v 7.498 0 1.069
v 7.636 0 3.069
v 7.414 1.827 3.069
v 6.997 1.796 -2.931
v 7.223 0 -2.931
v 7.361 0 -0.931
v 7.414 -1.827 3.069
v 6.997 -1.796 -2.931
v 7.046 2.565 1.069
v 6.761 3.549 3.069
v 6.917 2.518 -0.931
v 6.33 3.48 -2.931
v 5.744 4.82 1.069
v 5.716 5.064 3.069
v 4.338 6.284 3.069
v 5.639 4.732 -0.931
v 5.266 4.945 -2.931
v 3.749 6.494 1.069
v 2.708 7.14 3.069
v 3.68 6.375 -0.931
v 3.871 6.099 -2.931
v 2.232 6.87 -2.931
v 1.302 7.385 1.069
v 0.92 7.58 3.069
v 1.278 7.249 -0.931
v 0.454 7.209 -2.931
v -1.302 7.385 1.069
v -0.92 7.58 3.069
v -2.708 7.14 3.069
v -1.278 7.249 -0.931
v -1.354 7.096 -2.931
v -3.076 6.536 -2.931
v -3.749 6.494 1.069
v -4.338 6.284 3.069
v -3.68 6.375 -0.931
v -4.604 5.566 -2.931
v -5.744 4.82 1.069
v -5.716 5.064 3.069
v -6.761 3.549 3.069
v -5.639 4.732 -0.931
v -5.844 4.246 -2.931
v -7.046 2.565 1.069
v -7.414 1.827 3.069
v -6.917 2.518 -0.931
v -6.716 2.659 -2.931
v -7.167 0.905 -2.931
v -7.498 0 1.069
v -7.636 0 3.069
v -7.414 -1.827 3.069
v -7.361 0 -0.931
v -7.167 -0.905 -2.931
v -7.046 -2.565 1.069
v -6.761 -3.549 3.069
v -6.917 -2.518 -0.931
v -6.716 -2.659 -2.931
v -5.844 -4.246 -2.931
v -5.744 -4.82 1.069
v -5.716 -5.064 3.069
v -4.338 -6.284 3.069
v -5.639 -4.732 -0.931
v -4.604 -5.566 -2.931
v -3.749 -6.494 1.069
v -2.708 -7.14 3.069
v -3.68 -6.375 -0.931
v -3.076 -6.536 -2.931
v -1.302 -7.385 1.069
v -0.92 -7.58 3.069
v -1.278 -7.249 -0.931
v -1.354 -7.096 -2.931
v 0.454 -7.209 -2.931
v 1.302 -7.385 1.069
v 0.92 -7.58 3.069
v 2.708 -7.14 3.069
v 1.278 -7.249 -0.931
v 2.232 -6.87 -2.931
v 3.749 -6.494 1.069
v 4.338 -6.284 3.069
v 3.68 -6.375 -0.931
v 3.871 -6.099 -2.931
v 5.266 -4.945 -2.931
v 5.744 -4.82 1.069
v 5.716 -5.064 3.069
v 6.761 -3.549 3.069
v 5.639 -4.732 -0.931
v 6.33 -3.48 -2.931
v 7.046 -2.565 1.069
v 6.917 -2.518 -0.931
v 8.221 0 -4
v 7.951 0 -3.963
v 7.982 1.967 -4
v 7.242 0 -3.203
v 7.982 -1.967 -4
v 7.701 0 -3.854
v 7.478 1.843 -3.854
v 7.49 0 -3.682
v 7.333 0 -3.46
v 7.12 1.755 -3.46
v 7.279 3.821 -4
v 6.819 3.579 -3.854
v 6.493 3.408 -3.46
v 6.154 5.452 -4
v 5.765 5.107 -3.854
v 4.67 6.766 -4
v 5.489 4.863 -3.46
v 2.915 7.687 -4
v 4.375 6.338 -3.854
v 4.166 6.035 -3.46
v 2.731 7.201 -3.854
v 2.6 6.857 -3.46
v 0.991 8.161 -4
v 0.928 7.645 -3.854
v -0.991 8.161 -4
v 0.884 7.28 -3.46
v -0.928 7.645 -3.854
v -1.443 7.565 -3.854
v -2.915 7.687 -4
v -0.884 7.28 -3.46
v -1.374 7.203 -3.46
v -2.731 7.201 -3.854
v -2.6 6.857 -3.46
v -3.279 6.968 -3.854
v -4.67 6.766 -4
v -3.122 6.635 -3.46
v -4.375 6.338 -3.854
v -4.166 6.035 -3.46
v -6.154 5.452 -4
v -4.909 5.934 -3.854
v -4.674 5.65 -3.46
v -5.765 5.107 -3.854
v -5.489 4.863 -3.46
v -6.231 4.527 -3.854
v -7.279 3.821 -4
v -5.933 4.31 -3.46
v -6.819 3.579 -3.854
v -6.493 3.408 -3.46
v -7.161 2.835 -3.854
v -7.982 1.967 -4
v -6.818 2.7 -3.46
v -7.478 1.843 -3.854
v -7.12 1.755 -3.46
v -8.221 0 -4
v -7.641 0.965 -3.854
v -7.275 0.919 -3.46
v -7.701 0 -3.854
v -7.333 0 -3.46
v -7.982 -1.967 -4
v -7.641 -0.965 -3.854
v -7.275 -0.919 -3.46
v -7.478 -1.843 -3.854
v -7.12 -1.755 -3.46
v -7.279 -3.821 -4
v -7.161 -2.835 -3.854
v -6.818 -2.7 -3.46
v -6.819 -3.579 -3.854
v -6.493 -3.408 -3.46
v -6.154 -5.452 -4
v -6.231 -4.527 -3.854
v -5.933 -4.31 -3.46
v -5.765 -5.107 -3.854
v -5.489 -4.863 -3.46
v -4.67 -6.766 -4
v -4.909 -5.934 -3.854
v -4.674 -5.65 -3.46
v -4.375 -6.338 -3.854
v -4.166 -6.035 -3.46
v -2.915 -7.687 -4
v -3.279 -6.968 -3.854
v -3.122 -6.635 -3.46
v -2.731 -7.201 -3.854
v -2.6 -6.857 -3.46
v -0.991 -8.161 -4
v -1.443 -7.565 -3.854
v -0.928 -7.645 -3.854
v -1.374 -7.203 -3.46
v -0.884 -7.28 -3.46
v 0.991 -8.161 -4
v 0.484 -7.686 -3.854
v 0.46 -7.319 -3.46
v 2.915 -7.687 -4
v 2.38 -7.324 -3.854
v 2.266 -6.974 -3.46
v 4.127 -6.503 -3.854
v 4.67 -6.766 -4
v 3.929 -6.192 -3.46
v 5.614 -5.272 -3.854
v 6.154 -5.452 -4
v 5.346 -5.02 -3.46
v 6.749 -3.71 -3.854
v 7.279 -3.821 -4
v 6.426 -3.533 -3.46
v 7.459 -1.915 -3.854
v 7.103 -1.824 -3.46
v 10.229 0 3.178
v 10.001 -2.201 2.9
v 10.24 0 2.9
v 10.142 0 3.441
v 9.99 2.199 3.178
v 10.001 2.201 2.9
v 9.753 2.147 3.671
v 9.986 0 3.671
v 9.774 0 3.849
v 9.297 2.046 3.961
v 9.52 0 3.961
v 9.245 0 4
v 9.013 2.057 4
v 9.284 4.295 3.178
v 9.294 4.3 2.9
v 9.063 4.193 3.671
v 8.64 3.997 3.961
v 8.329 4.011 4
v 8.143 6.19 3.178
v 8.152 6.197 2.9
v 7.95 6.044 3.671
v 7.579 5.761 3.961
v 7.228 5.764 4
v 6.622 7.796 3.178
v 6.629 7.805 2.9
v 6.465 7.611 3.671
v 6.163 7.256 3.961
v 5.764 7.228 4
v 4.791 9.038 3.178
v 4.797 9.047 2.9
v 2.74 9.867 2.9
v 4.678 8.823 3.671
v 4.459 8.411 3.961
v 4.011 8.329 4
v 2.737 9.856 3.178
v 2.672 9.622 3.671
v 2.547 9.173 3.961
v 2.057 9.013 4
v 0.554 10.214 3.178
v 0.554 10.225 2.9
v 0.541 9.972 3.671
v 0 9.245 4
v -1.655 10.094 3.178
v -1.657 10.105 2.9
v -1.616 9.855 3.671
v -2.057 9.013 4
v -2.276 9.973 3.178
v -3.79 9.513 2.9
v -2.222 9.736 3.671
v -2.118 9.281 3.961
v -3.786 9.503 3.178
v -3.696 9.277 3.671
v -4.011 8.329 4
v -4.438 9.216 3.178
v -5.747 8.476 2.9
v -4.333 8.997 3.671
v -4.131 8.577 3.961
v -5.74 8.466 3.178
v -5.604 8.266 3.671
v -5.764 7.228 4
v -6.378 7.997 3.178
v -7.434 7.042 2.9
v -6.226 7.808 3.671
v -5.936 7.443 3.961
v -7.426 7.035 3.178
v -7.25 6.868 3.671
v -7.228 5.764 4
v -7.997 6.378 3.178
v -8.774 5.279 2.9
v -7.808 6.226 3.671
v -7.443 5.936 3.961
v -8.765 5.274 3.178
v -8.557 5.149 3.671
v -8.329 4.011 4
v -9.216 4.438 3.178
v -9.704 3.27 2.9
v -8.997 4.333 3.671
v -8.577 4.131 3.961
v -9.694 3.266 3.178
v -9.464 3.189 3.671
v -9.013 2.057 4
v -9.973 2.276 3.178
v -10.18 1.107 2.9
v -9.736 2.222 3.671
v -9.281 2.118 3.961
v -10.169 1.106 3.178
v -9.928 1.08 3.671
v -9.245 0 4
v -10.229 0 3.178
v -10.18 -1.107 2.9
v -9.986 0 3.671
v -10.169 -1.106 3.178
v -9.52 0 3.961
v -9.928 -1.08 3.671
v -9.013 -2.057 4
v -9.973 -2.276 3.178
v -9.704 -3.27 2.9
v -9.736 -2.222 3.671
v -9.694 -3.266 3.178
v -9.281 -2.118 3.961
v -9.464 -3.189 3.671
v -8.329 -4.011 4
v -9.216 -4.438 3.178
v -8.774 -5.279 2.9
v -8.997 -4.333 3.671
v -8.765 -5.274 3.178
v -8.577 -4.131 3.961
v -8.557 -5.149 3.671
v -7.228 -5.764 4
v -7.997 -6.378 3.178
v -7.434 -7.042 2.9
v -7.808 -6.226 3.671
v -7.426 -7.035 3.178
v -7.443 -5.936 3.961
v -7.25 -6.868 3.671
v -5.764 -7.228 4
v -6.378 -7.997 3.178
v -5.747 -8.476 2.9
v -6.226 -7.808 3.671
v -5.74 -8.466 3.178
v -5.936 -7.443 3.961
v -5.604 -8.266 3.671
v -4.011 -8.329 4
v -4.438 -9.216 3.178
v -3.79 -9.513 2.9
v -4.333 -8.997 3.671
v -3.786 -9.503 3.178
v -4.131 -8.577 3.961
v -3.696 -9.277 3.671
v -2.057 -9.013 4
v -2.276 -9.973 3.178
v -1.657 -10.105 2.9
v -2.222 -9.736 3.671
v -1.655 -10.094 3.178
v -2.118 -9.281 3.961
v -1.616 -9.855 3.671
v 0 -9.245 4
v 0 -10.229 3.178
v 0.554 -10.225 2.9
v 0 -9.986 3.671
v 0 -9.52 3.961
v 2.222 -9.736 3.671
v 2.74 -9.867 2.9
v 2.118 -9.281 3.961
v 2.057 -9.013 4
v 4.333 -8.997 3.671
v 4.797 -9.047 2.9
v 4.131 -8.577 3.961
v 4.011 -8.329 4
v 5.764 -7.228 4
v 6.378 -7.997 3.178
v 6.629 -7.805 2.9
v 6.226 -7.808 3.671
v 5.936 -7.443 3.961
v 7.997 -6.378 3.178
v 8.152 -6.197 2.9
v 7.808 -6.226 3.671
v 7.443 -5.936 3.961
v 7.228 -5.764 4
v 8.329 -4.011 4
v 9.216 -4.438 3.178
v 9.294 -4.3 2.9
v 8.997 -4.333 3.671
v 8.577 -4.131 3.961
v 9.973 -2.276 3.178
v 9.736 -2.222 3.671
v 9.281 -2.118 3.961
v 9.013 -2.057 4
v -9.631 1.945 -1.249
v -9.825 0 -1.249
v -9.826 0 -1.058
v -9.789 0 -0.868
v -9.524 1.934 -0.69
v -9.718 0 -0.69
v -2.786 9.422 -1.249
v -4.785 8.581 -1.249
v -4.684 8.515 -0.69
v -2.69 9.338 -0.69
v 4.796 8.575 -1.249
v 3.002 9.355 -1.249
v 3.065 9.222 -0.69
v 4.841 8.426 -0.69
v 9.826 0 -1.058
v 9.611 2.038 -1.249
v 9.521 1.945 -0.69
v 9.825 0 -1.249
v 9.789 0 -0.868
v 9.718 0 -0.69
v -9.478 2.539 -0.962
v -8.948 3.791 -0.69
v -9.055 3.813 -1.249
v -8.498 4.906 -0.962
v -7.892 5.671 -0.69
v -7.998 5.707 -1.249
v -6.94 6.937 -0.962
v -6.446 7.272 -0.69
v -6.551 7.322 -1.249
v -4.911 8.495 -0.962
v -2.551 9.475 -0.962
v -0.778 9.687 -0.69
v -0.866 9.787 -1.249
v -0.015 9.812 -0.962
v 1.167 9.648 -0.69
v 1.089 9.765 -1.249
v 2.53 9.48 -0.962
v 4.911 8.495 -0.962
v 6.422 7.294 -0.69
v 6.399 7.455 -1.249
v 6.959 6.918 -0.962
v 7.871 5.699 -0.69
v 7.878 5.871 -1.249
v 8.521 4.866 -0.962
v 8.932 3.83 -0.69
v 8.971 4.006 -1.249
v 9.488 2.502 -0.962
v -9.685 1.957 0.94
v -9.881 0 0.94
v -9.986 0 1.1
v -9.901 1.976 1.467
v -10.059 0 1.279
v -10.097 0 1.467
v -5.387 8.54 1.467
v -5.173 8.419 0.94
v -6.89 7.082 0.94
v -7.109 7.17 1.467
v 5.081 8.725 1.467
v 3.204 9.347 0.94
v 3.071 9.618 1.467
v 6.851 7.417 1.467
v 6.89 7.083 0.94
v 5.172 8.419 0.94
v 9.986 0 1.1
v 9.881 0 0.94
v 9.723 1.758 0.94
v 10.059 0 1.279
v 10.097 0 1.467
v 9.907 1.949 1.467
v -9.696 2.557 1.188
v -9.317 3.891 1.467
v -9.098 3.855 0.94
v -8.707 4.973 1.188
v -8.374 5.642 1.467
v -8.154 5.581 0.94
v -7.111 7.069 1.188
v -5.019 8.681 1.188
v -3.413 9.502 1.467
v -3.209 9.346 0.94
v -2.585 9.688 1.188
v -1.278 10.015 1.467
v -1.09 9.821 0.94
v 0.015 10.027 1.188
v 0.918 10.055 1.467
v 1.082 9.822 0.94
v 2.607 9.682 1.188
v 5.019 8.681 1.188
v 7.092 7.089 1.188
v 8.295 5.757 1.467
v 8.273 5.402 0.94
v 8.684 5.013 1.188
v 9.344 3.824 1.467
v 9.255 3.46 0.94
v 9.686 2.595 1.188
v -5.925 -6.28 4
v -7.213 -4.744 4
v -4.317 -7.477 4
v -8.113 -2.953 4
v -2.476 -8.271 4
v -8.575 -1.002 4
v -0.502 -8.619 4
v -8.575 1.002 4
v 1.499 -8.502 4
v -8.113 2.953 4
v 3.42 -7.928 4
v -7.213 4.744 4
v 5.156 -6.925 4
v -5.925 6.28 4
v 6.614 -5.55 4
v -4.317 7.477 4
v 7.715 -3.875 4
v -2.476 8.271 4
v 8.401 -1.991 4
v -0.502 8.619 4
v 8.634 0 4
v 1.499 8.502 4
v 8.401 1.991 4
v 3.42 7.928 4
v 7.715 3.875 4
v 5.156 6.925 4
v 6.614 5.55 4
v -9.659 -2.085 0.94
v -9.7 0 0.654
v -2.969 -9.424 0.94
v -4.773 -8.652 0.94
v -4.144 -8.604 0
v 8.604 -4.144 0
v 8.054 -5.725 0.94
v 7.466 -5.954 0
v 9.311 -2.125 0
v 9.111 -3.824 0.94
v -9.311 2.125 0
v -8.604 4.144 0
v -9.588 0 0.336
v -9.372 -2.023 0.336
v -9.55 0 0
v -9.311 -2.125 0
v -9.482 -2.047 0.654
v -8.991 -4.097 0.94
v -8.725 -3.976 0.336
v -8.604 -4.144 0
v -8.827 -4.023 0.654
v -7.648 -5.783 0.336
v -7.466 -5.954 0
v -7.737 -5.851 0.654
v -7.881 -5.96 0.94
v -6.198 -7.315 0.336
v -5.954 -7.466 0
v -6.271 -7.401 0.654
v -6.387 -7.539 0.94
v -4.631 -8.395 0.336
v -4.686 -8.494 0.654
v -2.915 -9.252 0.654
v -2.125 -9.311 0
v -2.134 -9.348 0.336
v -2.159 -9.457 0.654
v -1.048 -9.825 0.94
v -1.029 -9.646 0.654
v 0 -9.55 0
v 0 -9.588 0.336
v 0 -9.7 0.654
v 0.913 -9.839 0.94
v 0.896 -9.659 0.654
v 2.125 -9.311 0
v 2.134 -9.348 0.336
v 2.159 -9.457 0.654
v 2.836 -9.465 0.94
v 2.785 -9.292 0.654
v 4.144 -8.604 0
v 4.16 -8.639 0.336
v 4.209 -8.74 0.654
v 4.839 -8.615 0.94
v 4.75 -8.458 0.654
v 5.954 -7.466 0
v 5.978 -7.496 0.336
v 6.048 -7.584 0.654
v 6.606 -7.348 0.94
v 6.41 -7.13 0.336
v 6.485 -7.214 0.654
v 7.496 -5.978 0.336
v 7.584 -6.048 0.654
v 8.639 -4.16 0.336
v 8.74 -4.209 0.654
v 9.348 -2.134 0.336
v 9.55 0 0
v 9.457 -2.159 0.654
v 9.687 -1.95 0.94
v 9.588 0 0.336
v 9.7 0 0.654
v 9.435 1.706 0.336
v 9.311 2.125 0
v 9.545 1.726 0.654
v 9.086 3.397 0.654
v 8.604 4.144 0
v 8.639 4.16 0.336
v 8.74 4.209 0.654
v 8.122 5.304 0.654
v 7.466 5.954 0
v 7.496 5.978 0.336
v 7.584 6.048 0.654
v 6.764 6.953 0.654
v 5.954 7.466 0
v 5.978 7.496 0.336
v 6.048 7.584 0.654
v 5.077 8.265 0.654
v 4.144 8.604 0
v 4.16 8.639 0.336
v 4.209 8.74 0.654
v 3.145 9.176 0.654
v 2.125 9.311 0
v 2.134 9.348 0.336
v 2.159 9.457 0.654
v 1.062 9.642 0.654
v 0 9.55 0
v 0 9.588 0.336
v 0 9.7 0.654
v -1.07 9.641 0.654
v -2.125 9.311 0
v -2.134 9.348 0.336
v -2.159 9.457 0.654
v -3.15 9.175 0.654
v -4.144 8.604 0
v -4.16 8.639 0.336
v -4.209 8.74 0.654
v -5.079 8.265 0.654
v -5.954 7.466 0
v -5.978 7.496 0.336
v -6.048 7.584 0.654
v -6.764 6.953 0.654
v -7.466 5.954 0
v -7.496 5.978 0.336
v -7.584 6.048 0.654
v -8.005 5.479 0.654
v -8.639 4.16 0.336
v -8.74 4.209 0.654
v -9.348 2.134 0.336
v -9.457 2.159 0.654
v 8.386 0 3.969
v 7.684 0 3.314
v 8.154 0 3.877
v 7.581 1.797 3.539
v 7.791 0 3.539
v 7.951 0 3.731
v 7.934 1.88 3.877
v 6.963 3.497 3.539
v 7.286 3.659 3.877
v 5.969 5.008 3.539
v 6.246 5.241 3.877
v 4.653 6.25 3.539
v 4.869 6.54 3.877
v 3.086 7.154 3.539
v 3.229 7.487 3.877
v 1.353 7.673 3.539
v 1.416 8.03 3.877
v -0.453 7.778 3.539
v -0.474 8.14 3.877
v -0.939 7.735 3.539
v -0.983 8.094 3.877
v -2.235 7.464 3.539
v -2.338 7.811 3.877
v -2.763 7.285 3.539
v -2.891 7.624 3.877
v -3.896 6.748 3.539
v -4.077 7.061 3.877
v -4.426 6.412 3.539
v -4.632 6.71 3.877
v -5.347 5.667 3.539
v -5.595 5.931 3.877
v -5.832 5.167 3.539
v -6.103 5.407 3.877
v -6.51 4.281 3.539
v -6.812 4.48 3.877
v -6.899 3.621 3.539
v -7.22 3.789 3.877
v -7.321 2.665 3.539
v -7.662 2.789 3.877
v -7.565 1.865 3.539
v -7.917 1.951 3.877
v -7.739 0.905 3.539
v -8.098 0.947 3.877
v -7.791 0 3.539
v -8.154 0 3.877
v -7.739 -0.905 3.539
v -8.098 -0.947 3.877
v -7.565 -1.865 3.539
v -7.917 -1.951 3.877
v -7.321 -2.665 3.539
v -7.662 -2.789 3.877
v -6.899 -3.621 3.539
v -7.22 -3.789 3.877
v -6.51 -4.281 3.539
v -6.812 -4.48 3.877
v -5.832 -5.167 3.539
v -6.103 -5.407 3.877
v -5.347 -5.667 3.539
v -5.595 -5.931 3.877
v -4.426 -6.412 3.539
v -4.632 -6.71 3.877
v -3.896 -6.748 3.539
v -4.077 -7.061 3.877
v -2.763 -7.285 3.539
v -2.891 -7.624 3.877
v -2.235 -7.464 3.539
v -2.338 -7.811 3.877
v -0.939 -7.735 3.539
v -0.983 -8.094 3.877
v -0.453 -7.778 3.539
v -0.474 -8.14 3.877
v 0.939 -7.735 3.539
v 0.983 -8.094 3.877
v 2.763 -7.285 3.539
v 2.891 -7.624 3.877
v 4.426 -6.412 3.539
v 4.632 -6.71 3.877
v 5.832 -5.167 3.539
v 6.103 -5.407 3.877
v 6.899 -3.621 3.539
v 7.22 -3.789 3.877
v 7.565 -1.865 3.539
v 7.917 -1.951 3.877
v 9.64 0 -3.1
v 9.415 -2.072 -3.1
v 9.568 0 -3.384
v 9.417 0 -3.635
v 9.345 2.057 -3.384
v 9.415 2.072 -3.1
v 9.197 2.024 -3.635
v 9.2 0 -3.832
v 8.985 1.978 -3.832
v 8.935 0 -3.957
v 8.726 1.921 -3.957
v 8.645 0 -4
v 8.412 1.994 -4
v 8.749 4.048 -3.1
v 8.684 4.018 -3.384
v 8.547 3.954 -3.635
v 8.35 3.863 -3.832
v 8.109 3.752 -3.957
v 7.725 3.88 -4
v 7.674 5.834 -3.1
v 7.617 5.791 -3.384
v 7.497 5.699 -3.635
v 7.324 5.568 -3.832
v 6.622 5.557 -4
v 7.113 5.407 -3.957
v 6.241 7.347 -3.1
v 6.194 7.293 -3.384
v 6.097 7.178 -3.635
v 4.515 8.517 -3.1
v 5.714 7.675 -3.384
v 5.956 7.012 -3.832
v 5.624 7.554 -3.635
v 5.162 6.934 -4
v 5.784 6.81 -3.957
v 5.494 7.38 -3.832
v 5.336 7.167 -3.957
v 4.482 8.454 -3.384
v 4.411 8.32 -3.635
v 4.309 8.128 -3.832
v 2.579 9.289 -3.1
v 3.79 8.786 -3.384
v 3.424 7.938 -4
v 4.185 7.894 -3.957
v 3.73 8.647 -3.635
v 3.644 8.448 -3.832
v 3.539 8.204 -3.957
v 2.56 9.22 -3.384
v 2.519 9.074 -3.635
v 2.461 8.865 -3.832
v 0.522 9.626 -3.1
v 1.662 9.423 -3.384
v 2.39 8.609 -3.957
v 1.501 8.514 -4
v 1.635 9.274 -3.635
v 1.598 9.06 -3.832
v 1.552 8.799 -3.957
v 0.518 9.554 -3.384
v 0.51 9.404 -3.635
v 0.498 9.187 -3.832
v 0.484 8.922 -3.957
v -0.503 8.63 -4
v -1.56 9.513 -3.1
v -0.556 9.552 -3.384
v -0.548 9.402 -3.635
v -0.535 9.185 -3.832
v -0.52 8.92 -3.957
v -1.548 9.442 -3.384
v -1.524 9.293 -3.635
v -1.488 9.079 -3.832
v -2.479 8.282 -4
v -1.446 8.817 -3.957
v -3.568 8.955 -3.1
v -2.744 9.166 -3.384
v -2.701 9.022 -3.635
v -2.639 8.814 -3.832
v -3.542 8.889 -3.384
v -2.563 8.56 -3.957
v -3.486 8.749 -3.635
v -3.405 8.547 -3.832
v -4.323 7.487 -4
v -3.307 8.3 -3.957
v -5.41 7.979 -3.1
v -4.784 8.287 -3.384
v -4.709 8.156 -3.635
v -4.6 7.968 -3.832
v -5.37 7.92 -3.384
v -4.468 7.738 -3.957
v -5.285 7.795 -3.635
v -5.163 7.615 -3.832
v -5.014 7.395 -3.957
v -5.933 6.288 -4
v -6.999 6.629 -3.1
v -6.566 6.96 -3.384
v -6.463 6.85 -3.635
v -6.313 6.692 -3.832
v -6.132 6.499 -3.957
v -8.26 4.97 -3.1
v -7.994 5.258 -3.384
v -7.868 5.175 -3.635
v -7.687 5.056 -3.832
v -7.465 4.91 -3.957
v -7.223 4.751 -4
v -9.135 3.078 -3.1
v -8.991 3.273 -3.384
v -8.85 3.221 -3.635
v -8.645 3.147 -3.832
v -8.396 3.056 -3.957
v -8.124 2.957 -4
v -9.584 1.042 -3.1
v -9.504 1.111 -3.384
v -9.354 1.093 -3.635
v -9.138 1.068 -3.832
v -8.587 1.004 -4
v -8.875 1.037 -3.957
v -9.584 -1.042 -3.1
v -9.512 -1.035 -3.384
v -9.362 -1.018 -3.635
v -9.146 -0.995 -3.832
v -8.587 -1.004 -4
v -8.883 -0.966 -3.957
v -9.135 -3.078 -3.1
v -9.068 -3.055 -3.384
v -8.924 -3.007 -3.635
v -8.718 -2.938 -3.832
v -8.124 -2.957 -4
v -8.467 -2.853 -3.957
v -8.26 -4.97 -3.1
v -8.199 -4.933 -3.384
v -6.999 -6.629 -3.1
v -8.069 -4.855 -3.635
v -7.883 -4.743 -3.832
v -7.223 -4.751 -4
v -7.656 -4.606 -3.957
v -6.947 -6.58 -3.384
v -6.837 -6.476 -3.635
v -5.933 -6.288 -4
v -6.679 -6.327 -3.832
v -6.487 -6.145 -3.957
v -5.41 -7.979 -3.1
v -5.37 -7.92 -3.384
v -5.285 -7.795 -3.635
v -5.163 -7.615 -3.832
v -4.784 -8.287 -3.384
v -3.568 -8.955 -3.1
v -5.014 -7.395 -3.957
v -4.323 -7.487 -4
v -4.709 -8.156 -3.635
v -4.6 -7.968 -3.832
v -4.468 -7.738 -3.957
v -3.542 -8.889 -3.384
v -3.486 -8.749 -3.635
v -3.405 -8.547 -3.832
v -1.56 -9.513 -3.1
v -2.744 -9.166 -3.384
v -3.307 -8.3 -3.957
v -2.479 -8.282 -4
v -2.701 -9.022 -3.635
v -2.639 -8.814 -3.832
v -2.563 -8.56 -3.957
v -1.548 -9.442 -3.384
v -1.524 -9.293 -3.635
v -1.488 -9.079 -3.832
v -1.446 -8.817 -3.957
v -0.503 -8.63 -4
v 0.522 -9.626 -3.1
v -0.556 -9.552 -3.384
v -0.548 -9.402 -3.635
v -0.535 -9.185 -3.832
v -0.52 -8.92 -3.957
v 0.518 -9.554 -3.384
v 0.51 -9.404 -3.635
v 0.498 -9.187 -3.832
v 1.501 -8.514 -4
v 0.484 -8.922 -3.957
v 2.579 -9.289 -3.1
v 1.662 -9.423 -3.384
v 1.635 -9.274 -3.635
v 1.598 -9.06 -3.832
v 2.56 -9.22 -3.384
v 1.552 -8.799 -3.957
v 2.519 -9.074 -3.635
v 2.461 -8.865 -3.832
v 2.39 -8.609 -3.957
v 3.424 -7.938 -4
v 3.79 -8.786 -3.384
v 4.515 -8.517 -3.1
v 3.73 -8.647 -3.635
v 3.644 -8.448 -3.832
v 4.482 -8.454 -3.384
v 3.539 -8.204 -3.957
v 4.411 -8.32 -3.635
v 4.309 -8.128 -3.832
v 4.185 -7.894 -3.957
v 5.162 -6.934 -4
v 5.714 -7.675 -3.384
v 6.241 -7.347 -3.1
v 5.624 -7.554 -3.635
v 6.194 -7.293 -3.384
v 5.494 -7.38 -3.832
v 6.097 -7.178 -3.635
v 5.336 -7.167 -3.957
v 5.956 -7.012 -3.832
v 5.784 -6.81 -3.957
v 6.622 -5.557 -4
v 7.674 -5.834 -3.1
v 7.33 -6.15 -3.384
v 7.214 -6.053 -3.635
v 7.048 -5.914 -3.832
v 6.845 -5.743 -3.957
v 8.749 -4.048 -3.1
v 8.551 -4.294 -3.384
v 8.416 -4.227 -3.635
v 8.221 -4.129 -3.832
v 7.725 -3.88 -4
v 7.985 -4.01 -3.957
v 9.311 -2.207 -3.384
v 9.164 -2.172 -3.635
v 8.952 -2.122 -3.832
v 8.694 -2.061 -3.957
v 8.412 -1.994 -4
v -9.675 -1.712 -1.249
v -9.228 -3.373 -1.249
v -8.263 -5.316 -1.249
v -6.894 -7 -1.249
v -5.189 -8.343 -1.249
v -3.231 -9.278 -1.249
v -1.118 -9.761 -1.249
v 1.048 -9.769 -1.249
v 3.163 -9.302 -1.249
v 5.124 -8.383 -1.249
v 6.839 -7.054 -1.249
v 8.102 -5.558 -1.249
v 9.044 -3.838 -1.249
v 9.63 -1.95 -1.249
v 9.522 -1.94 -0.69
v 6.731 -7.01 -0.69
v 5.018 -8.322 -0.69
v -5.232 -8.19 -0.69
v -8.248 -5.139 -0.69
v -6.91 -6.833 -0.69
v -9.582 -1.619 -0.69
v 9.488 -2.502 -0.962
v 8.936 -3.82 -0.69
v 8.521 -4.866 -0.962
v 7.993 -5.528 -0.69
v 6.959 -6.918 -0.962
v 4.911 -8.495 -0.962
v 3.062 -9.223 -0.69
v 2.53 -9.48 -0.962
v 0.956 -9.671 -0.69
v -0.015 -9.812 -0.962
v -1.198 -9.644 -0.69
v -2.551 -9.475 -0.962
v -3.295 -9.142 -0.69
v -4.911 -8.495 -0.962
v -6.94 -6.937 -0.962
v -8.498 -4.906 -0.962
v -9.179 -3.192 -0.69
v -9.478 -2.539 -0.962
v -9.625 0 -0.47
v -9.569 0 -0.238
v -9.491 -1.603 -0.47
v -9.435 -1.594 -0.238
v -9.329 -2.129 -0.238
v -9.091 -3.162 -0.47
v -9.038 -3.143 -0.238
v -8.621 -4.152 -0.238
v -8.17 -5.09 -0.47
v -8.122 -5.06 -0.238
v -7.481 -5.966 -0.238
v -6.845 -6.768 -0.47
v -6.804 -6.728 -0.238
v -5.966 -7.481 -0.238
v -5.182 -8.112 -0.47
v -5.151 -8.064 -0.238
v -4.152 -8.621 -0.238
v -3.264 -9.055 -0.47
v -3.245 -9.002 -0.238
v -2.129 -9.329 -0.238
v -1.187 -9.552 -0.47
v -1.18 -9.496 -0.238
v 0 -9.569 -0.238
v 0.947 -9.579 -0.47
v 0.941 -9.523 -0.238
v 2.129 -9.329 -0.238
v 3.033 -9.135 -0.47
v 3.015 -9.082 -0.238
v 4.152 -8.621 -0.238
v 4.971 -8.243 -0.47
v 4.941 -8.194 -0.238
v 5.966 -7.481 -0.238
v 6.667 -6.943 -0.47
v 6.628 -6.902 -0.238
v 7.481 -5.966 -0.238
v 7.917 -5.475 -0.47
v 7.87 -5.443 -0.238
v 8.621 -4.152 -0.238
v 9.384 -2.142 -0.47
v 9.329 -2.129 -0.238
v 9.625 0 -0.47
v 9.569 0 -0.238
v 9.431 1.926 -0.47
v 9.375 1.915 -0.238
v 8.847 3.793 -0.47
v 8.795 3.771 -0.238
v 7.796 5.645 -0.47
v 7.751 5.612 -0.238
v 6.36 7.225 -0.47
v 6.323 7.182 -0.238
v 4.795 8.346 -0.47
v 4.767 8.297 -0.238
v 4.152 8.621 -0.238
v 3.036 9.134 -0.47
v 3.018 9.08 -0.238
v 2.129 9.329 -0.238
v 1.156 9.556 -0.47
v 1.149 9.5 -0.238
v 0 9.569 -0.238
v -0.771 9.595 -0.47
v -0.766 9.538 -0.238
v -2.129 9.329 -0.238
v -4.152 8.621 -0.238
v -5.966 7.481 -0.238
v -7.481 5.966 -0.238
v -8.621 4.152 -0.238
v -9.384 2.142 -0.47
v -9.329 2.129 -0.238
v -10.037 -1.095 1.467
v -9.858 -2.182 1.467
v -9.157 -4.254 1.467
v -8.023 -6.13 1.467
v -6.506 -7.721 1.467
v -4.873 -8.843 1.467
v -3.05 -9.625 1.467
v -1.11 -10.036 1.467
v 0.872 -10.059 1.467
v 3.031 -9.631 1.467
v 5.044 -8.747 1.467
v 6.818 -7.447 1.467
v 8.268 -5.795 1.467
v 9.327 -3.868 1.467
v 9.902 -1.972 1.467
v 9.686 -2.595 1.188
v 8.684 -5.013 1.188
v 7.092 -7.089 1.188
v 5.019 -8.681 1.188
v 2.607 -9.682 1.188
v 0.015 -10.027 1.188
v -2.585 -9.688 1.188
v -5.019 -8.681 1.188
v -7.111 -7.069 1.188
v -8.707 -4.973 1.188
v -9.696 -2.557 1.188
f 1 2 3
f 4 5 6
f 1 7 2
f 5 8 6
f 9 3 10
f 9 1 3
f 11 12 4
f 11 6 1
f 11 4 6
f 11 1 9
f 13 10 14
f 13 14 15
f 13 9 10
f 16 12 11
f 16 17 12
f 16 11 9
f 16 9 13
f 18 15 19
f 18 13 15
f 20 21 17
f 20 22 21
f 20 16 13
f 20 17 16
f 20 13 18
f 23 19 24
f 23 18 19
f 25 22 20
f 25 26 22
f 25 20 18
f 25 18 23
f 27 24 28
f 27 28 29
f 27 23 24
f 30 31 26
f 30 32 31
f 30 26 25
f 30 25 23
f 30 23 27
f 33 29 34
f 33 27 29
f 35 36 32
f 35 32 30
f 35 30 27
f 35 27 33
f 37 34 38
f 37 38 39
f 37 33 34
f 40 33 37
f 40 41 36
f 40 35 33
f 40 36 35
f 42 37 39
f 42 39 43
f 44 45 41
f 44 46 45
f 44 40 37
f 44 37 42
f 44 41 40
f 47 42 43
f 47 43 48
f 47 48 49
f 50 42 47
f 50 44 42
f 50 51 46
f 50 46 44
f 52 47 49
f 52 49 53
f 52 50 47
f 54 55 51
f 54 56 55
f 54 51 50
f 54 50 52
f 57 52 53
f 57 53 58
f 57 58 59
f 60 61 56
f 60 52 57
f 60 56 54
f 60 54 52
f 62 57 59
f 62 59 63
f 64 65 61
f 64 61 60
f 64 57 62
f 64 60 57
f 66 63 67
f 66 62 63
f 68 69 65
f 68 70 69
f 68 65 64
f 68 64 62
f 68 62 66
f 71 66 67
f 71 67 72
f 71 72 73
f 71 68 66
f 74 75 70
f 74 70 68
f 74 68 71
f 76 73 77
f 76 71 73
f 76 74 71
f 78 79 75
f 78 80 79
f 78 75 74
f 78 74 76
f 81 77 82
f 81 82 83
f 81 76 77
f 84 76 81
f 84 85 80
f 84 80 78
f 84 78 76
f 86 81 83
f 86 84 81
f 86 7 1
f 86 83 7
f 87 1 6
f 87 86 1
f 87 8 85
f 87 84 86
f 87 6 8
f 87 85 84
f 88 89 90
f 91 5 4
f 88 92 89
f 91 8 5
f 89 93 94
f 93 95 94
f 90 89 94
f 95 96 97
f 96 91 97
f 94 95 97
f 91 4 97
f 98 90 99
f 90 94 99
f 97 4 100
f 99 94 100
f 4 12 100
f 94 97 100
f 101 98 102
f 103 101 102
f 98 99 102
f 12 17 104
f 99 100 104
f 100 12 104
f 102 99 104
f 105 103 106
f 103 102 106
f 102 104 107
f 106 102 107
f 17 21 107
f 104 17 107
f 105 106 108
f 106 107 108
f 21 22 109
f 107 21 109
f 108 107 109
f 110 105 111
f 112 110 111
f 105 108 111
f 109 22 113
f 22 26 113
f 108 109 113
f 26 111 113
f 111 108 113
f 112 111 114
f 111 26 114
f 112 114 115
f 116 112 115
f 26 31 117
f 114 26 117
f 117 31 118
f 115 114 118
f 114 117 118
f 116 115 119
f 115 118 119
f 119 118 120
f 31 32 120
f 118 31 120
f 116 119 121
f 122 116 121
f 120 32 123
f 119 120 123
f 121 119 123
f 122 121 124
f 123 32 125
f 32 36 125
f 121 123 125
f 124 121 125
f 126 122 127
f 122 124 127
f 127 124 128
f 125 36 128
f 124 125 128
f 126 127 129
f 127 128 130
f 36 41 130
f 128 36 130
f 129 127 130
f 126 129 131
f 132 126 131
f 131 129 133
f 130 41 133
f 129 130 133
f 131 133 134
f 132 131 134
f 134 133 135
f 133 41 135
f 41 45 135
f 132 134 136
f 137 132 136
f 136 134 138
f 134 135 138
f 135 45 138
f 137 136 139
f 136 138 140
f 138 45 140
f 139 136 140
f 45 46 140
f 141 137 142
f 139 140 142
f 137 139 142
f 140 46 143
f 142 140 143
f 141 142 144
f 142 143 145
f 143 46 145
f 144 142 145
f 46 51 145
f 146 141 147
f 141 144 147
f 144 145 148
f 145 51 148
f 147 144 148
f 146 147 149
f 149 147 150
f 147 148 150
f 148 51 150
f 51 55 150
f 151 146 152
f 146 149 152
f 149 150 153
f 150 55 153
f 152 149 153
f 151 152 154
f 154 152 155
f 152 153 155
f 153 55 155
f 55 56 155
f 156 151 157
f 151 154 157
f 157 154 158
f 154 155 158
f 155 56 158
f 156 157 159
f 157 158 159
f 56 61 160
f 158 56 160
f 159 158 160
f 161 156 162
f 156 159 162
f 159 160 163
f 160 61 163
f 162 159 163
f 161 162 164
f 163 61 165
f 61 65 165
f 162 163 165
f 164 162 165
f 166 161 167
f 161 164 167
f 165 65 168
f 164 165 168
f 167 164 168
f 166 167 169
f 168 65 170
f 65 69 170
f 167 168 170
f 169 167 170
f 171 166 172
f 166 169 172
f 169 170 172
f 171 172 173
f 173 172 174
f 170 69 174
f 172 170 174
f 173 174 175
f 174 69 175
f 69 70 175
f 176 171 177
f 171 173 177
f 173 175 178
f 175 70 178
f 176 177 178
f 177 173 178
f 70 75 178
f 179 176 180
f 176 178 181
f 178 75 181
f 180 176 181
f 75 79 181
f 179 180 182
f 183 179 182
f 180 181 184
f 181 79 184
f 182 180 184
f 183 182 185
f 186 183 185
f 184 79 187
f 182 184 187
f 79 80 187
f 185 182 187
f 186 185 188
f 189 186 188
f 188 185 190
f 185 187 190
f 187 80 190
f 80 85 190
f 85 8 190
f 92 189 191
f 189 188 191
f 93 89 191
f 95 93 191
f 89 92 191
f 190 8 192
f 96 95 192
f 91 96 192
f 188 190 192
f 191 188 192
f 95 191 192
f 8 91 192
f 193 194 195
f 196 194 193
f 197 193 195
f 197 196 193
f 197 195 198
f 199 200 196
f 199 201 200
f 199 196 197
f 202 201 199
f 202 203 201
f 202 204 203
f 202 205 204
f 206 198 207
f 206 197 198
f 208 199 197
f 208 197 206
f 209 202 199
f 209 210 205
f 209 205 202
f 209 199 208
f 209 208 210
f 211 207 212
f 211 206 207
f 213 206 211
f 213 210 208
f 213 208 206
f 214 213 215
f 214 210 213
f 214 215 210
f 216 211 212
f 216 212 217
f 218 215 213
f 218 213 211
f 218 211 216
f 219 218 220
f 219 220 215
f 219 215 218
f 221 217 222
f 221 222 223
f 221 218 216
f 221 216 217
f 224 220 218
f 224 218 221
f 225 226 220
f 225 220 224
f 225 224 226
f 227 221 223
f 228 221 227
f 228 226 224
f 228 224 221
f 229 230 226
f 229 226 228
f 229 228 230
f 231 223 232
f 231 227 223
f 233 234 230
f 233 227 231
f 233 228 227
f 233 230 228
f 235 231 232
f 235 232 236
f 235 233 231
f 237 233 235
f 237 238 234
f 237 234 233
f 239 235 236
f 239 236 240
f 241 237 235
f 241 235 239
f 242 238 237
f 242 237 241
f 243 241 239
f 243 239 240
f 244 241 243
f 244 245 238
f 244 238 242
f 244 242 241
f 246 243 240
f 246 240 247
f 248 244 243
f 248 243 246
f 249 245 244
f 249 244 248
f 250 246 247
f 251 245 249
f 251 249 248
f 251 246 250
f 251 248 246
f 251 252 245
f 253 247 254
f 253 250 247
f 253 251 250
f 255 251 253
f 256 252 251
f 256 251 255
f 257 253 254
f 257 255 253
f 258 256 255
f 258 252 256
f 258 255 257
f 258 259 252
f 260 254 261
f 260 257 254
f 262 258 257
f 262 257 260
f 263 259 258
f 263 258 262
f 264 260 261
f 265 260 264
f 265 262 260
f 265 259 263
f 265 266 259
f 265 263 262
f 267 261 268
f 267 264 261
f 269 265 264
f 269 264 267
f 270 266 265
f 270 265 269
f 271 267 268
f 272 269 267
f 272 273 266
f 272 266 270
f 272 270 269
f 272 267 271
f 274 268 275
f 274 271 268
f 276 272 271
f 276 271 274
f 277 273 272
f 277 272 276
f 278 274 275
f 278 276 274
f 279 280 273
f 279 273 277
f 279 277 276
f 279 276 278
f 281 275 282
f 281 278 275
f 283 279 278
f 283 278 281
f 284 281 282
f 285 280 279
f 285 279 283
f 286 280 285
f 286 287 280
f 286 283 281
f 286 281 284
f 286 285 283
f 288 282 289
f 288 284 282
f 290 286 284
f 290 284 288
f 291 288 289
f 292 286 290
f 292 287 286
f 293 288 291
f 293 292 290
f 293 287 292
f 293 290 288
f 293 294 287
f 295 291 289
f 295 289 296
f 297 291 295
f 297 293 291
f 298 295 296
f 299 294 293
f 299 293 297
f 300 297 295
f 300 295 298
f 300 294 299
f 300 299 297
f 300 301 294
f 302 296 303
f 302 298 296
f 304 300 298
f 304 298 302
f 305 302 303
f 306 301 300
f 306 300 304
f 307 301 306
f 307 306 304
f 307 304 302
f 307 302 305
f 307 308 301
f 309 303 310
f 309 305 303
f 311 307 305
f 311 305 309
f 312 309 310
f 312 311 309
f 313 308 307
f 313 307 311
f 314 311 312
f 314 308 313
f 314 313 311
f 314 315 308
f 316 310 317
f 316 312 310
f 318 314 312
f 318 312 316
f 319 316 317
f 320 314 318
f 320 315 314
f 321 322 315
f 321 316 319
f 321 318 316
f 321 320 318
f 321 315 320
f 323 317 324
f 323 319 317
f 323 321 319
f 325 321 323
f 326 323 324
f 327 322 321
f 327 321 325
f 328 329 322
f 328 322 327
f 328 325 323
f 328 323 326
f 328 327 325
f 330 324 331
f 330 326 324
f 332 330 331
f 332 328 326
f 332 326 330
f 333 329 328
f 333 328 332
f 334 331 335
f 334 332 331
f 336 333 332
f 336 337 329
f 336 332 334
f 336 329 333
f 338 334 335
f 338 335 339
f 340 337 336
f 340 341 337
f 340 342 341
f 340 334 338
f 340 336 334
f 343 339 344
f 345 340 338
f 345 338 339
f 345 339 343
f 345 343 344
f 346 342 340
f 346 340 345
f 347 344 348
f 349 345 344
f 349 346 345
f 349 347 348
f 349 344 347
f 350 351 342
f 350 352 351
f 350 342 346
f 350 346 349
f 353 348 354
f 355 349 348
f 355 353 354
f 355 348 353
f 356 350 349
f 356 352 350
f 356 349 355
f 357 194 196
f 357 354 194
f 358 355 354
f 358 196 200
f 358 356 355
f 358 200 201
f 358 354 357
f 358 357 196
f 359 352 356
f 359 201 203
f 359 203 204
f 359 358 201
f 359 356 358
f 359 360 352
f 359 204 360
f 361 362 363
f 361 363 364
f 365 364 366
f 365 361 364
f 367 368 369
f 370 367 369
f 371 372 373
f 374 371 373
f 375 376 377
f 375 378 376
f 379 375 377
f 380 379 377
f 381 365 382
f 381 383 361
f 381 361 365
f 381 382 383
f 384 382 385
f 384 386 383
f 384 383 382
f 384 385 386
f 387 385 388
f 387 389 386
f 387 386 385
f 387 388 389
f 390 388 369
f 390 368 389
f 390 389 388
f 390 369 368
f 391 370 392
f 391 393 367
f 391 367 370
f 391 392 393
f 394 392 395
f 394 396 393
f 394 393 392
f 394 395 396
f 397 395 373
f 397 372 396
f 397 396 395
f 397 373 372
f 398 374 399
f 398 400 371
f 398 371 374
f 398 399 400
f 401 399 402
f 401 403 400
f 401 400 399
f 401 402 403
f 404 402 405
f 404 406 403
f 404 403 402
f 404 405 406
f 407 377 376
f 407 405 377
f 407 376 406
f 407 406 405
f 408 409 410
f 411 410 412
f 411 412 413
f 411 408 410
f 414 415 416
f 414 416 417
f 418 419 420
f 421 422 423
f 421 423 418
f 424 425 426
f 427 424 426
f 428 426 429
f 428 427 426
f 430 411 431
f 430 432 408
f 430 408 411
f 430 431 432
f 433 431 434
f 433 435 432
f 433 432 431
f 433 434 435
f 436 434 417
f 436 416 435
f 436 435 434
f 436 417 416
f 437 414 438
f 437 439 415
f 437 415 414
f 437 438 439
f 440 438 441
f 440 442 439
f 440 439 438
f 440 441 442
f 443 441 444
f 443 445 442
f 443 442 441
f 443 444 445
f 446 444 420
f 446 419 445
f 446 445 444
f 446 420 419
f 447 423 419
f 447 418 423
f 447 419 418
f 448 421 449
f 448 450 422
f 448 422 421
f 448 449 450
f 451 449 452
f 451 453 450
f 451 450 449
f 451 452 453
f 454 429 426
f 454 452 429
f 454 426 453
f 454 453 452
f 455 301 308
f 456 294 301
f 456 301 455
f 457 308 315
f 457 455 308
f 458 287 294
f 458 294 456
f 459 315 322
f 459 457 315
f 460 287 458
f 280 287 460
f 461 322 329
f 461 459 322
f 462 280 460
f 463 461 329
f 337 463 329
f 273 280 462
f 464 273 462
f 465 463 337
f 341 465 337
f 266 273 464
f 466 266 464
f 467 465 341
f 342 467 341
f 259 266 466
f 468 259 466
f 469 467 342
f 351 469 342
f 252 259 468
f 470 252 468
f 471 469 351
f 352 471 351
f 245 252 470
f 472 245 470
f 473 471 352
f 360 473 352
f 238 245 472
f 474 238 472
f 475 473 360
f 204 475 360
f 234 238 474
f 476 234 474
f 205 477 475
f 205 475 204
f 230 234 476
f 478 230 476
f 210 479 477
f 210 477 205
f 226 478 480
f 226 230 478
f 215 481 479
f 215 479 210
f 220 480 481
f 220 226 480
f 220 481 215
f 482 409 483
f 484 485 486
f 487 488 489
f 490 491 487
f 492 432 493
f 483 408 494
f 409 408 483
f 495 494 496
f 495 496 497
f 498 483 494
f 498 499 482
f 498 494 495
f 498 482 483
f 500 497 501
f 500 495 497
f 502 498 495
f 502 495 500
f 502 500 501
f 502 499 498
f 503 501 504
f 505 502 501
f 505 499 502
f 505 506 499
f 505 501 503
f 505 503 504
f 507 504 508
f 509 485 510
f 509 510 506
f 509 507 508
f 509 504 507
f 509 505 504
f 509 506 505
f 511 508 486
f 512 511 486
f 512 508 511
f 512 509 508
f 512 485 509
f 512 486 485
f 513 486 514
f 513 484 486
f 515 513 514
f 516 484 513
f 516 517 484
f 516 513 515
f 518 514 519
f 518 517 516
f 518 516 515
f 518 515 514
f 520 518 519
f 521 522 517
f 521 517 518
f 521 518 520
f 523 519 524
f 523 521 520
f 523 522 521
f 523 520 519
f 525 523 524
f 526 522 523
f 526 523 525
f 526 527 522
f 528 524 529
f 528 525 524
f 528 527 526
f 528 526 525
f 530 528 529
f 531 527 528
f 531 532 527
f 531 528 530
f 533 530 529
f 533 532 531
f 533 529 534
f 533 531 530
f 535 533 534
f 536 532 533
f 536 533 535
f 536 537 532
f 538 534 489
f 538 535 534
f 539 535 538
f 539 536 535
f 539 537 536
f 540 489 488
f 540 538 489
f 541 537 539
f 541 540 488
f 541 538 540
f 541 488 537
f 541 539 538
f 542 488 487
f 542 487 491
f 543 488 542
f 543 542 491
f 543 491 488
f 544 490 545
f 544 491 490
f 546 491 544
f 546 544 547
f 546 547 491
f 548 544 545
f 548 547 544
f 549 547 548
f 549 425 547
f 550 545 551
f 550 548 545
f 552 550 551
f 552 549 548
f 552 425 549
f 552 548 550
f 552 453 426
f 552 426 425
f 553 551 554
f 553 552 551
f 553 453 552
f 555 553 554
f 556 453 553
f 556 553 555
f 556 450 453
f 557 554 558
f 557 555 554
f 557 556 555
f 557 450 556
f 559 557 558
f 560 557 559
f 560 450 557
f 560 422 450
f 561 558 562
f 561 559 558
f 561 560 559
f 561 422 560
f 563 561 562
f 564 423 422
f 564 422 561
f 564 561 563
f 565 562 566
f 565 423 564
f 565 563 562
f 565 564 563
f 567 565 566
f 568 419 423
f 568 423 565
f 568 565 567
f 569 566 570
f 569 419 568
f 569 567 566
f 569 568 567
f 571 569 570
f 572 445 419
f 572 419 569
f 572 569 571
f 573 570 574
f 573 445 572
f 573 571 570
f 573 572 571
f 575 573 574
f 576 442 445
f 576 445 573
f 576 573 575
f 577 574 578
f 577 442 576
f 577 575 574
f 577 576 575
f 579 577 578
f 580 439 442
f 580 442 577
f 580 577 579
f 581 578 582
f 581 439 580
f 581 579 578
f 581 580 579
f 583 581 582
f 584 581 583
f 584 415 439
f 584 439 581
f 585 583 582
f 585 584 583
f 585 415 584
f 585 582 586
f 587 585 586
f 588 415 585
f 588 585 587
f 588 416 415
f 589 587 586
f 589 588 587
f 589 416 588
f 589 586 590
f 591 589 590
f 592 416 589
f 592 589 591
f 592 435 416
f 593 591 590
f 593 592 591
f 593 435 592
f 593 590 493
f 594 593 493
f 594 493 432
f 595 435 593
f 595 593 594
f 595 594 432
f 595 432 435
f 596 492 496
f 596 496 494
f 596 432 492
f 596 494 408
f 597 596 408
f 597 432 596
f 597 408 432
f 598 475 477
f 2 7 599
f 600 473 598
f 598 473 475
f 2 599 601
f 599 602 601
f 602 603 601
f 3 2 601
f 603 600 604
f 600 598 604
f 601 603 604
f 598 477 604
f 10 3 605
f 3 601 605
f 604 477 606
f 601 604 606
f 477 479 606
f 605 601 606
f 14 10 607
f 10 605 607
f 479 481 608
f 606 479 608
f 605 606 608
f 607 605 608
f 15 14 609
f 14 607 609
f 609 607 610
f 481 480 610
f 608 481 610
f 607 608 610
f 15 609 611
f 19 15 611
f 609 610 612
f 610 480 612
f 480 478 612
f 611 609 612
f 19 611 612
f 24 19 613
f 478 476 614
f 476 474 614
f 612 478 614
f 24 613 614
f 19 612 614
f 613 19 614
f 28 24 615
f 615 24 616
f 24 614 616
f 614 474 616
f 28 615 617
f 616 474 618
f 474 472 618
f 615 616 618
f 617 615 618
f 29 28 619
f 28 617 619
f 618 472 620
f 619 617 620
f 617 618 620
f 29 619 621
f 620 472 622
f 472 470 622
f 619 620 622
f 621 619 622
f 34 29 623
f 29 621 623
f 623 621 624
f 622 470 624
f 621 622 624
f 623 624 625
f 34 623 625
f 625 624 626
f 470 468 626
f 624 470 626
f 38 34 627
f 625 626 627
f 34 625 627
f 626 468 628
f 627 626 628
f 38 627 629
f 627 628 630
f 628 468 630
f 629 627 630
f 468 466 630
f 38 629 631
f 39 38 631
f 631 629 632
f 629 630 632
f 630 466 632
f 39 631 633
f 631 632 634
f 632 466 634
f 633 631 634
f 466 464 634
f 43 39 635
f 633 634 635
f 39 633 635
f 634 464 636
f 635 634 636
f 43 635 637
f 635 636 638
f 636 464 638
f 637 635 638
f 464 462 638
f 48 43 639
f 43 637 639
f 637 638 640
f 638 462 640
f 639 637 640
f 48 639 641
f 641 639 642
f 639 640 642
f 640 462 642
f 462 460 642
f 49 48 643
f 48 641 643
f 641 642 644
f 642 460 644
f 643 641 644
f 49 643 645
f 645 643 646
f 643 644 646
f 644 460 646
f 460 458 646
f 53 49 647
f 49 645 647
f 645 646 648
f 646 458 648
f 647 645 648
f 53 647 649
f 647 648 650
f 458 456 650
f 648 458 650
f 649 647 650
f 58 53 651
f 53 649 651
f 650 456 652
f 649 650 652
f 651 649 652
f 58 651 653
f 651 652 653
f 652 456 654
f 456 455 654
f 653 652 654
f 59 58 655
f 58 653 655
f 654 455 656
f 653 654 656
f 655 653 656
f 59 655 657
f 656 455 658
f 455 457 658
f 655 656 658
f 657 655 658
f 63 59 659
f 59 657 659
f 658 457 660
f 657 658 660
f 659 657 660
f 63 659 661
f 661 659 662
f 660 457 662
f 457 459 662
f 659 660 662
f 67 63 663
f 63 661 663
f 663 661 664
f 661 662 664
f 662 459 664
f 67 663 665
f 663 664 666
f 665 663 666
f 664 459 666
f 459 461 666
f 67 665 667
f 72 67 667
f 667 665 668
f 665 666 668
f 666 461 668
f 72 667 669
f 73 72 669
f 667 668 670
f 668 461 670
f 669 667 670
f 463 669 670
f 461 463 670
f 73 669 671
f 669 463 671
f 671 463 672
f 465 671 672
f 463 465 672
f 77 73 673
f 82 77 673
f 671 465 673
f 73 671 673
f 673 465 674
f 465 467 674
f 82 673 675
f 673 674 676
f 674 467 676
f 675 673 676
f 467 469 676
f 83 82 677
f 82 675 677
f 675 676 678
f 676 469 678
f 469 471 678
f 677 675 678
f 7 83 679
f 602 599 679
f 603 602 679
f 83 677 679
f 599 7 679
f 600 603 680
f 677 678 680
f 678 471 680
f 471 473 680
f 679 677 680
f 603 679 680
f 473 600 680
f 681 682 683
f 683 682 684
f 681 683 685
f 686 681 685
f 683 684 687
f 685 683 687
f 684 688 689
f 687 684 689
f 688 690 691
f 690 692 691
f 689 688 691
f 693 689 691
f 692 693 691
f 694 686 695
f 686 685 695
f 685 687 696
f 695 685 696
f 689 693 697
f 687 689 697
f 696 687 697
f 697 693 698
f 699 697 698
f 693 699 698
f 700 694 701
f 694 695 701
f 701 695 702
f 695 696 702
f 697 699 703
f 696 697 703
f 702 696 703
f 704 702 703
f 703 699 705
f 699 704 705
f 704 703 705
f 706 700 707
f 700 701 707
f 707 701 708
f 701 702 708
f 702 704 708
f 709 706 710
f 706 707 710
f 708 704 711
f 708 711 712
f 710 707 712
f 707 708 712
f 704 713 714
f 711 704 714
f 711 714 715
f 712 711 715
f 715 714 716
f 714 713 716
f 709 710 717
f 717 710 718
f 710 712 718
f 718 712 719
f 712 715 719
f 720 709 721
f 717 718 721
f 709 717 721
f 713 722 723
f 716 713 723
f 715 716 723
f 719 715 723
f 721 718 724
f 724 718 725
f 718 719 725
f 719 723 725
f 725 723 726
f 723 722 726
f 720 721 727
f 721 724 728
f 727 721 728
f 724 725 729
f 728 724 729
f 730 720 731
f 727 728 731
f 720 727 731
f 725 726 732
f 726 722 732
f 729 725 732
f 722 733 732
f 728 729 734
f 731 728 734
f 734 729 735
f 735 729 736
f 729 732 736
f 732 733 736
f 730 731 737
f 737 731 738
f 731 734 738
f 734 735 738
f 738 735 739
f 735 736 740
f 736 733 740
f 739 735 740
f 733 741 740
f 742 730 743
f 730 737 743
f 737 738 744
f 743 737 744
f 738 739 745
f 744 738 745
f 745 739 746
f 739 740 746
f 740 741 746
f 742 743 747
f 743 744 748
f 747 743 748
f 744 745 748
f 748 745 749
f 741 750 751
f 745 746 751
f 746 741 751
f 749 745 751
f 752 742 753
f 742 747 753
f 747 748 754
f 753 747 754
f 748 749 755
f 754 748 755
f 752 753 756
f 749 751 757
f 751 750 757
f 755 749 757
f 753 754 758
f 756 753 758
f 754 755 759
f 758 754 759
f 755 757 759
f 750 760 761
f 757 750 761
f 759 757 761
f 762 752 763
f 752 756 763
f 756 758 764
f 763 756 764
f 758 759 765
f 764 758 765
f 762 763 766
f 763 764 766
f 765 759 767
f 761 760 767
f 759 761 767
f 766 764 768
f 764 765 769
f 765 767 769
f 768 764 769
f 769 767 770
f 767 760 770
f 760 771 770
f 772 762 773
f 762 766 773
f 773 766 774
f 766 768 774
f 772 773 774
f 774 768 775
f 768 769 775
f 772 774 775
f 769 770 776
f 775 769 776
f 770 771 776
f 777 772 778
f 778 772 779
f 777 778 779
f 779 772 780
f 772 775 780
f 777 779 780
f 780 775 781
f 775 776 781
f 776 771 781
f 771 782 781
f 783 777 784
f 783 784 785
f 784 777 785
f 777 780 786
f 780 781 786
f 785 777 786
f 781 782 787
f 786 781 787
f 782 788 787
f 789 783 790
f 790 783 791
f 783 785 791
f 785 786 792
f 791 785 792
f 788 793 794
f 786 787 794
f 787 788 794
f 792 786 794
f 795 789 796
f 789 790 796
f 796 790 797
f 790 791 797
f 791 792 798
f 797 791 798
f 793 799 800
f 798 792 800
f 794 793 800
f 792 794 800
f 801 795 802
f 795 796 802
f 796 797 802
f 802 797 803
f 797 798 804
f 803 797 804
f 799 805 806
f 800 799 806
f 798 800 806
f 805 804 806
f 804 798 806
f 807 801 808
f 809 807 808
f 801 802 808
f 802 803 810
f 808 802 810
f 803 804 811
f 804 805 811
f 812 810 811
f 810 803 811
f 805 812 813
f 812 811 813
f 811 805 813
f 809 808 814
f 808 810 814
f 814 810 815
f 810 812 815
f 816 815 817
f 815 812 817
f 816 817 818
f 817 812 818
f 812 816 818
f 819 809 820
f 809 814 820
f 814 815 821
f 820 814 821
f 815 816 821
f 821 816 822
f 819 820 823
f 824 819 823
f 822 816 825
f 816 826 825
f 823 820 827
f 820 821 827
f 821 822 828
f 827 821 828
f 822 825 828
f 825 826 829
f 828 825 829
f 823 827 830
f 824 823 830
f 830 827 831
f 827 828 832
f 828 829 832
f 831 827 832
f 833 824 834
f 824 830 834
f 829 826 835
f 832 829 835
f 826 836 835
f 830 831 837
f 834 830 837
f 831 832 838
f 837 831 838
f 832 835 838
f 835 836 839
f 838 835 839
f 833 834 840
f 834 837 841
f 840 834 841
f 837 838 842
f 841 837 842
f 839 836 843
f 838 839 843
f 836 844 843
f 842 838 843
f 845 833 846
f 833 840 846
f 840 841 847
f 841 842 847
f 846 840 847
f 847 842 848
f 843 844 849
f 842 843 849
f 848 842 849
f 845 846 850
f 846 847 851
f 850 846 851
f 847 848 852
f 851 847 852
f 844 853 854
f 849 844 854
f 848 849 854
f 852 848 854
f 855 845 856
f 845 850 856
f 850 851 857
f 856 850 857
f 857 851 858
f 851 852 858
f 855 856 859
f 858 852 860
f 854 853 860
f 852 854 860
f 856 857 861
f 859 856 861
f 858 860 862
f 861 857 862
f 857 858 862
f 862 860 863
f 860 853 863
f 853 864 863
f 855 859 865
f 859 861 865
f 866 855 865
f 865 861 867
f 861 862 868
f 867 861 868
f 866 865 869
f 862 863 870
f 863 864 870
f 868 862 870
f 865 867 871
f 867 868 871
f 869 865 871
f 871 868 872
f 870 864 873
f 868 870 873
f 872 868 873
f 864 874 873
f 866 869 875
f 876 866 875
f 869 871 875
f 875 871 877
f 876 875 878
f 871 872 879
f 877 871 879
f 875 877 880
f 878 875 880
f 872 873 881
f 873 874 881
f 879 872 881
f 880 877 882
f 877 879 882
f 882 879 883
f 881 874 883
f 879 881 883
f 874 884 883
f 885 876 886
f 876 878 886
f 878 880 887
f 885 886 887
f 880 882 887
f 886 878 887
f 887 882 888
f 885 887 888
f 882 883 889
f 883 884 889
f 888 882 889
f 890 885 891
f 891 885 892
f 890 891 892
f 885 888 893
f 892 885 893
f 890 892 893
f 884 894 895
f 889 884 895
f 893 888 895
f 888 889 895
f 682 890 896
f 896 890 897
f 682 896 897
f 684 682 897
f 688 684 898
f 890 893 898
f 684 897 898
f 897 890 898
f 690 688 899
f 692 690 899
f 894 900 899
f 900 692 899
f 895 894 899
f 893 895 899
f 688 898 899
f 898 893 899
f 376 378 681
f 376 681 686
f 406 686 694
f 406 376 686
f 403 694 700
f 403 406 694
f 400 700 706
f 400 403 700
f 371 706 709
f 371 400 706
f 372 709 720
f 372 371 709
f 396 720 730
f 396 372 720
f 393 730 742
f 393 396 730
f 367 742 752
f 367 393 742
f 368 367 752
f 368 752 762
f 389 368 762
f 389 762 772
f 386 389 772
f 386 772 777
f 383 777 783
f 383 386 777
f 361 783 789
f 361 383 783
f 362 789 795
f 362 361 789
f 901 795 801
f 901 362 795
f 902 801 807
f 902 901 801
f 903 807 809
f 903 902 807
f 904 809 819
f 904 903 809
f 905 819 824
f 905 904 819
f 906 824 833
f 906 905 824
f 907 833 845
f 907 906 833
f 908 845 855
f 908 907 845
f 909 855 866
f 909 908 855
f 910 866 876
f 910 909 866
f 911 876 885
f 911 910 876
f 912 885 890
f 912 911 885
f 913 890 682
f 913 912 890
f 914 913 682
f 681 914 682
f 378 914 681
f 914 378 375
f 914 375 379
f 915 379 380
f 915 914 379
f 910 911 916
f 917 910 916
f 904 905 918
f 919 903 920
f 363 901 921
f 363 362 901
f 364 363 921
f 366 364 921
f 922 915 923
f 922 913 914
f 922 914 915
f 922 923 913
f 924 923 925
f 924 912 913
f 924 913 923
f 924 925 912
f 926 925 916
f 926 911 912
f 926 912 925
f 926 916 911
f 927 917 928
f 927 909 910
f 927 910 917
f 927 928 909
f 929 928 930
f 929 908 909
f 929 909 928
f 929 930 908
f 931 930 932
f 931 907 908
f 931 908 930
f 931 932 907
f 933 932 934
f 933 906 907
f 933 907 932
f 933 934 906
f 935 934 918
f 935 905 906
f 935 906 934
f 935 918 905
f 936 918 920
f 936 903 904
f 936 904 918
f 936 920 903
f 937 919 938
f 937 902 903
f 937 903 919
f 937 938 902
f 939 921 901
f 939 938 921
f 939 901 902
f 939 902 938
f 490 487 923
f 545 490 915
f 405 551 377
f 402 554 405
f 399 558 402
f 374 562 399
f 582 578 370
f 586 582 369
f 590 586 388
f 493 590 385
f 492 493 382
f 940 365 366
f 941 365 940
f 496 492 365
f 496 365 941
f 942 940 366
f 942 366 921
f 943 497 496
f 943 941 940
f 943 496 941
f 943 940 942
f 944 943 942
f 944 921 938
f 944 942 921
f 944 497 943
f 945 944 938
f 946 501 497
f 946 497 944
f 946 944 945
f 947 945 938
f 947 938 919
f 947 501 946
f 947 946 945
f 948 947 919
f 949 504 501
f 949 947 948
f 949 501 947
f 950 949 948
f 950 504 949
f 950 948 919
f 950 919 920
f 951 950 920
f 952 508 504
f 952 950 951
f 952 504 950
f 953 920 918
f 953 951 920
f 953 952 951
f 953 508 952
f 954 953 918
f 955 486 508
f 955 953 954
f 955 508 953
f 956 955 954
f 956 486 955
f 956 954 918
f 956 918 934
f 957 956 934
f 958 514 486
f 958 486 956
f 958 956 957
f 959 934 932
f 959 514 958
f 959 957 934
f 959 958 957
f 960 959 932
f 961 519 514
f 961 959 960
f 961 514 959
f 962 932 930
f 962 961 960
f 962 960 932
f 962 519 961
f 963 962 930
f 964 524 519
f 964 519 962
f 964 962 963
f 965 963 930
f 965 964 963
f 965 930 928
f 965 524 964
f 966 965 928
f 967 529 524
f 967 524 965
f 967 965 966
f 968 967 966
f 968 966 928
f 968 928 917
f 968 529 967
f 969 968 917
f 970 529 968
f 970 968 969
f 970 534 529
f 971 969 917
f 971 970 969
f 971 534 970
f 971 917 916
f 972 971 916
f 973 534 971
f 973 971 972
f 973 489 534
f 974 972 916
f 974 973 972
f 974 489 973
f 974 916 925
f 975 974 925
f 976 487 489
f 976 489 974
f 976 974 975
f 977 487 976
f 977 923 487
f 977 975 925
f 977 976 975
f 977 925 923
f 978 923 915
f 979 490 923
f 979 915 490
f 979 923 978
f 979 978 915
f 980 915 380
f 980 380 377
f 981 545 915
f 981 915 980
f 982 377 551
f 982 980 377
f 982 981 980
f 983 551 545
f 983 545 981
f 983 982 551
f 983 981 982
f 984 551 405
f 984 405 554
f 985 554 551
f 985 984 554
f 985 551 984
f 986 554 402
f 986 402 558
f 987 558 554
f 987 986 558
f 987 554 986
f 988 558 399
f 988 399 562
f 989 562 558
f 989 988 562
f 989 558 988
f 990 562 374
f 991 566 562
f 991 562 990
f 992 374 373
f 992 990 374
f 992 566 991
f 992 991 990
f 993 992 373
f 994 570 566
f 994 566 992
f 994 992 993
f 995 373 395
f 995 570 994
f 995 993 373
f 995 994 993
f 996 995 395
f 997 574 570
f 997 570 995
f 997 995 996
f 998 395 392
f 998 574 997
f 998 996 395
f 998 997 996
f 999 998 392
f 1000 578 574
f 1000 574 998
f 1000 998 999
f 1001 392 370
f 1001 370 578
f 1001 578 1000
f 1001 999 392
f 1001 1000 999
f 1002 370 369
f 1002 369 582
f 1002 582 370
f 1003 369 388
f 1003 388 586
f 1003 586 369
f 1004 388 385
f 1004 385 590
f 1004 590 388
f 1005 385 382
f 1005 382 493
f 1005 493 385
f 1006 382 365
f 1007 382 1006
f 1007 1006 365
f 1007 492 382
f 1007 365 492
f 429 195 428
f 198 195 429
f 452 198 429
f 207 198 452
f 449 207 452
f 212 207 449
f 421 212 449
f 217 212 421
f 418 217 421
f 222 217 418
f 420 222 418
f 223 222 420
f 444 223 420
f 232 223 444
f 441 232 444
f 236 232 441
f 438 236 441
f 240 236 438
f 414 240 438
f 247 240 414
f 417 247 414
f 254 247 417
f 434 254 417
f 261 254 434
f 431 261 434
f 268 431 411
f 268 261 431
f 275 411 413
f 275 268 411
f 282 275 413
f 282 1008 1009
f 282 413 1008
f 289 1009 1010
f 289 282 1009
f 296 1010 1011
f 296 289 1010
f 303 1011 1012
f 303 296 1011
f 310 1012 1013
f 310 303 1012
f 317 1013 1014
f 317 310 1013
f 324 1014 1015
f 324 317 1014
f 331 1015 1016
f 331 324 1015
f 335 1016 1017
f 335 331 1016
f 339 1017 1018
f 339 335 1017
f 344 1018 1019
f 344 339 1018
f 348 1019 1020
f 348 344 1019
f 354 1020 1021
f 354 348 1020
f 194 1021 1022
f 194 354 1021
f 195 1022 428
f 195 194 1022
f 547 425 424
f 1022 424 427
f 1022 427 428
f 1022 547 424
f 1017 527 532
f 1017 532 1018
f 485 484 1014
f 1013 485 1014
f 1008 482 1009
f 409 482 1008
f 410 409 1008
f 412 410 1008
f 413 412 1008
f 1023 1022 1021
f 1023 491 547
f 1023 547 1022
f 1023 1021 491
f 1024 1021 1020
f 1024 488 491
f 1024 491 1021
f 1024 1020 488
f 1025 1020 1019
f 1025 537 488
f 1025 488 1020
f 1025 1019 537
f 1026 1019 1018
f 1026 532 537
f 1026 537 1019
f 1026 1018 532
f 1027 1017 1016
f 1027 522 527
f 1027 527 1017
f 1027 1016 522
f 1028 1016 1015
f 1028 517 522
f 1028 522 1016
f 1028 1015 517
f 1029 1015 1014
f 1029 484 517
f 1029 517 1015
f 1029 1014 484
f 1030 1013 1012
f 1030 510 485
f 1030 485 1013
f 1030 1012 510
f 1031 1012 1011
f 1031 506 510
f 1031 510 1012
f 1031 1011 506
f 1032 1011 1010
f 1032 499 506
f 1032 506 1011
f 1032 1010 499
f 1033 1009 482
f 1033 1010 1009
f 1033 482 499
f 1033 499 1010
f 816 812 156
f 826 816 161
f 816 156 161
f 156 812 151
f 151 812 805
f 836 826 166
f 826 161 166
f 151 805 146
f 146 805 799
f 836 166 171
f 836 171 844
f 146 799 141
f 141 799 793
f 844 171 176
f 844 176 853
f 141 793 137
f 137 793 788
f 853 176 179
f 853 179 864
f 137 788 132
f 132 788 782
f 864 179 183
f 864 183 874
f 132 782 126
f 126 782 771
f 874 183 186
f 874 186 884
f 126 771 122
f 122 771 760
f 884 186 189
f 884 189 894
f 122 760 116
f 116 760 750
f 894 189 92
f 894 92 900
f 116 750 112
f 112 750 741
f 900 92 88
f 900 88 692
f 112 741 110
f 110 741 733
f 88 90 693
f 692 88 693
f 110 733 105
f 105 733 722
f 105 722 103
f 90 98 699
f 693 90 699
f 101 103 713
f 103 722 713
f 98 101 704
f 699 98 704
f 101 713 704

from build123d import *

# Parameters (mm, degrees)
F1_R  = 1.5
F5_R  = 9.55
F6_R  = 10.35
F8_R  = 7.7
F9_R  = 7.15
F12_R = 1


with BuildPart() as f2:
    # F1 (on Front) → F2 (revolve)
    with BuildSketch(Plane.XZ):
        with Locations((-11.05, 0)):
            Circle(F1_R)
    revolve(axis=Axis((0, 0, 0), (0, 0, 1)))


with BuildPart() as f7:
    # F5 (on offset) → F7 section 0
    with BuildSketch(Plane.XY.offset(-4)):
        Circle(F5_R)
    # F6 (on offset) → F7 section 1
    with BuildSketch(Plane.XY.offset(4)):
        Circle(F6_R)
    loft()

    # F8 (on face) → F10 section 0
    with BuildSketch(Plane.XY.offset(4)):
        Circle(F8_R)
    # F9 (on face) → F10 section 1
    with BuildSketch(Plane.XY.offset(-4)):
        Circle(F9_R)
    loft(mode=Mode.SUBTRACT)

    # F11: cut F2
    add(f2.part, mode=Mode.SUBTRACT)

    # F12
    f12_edges = [f7.edges().sort_by_distance(p)[0] for p in [
        (-7.7, 0, 4),
        (-10.35, 0, 4),
        (9.55, 0, 0),
        (-9.55, 0, -4),
        (-7.15, 0, -4),
        (0, 9.858834, -0.91166),
        (0, -9.858834, -0.91166),
        (0, -10.062948, 1.129482),
        (0, 10.062948, 1.129482),
    ]]
    fillet(f12_edges, radius=F12_R)


solid = f7.part
